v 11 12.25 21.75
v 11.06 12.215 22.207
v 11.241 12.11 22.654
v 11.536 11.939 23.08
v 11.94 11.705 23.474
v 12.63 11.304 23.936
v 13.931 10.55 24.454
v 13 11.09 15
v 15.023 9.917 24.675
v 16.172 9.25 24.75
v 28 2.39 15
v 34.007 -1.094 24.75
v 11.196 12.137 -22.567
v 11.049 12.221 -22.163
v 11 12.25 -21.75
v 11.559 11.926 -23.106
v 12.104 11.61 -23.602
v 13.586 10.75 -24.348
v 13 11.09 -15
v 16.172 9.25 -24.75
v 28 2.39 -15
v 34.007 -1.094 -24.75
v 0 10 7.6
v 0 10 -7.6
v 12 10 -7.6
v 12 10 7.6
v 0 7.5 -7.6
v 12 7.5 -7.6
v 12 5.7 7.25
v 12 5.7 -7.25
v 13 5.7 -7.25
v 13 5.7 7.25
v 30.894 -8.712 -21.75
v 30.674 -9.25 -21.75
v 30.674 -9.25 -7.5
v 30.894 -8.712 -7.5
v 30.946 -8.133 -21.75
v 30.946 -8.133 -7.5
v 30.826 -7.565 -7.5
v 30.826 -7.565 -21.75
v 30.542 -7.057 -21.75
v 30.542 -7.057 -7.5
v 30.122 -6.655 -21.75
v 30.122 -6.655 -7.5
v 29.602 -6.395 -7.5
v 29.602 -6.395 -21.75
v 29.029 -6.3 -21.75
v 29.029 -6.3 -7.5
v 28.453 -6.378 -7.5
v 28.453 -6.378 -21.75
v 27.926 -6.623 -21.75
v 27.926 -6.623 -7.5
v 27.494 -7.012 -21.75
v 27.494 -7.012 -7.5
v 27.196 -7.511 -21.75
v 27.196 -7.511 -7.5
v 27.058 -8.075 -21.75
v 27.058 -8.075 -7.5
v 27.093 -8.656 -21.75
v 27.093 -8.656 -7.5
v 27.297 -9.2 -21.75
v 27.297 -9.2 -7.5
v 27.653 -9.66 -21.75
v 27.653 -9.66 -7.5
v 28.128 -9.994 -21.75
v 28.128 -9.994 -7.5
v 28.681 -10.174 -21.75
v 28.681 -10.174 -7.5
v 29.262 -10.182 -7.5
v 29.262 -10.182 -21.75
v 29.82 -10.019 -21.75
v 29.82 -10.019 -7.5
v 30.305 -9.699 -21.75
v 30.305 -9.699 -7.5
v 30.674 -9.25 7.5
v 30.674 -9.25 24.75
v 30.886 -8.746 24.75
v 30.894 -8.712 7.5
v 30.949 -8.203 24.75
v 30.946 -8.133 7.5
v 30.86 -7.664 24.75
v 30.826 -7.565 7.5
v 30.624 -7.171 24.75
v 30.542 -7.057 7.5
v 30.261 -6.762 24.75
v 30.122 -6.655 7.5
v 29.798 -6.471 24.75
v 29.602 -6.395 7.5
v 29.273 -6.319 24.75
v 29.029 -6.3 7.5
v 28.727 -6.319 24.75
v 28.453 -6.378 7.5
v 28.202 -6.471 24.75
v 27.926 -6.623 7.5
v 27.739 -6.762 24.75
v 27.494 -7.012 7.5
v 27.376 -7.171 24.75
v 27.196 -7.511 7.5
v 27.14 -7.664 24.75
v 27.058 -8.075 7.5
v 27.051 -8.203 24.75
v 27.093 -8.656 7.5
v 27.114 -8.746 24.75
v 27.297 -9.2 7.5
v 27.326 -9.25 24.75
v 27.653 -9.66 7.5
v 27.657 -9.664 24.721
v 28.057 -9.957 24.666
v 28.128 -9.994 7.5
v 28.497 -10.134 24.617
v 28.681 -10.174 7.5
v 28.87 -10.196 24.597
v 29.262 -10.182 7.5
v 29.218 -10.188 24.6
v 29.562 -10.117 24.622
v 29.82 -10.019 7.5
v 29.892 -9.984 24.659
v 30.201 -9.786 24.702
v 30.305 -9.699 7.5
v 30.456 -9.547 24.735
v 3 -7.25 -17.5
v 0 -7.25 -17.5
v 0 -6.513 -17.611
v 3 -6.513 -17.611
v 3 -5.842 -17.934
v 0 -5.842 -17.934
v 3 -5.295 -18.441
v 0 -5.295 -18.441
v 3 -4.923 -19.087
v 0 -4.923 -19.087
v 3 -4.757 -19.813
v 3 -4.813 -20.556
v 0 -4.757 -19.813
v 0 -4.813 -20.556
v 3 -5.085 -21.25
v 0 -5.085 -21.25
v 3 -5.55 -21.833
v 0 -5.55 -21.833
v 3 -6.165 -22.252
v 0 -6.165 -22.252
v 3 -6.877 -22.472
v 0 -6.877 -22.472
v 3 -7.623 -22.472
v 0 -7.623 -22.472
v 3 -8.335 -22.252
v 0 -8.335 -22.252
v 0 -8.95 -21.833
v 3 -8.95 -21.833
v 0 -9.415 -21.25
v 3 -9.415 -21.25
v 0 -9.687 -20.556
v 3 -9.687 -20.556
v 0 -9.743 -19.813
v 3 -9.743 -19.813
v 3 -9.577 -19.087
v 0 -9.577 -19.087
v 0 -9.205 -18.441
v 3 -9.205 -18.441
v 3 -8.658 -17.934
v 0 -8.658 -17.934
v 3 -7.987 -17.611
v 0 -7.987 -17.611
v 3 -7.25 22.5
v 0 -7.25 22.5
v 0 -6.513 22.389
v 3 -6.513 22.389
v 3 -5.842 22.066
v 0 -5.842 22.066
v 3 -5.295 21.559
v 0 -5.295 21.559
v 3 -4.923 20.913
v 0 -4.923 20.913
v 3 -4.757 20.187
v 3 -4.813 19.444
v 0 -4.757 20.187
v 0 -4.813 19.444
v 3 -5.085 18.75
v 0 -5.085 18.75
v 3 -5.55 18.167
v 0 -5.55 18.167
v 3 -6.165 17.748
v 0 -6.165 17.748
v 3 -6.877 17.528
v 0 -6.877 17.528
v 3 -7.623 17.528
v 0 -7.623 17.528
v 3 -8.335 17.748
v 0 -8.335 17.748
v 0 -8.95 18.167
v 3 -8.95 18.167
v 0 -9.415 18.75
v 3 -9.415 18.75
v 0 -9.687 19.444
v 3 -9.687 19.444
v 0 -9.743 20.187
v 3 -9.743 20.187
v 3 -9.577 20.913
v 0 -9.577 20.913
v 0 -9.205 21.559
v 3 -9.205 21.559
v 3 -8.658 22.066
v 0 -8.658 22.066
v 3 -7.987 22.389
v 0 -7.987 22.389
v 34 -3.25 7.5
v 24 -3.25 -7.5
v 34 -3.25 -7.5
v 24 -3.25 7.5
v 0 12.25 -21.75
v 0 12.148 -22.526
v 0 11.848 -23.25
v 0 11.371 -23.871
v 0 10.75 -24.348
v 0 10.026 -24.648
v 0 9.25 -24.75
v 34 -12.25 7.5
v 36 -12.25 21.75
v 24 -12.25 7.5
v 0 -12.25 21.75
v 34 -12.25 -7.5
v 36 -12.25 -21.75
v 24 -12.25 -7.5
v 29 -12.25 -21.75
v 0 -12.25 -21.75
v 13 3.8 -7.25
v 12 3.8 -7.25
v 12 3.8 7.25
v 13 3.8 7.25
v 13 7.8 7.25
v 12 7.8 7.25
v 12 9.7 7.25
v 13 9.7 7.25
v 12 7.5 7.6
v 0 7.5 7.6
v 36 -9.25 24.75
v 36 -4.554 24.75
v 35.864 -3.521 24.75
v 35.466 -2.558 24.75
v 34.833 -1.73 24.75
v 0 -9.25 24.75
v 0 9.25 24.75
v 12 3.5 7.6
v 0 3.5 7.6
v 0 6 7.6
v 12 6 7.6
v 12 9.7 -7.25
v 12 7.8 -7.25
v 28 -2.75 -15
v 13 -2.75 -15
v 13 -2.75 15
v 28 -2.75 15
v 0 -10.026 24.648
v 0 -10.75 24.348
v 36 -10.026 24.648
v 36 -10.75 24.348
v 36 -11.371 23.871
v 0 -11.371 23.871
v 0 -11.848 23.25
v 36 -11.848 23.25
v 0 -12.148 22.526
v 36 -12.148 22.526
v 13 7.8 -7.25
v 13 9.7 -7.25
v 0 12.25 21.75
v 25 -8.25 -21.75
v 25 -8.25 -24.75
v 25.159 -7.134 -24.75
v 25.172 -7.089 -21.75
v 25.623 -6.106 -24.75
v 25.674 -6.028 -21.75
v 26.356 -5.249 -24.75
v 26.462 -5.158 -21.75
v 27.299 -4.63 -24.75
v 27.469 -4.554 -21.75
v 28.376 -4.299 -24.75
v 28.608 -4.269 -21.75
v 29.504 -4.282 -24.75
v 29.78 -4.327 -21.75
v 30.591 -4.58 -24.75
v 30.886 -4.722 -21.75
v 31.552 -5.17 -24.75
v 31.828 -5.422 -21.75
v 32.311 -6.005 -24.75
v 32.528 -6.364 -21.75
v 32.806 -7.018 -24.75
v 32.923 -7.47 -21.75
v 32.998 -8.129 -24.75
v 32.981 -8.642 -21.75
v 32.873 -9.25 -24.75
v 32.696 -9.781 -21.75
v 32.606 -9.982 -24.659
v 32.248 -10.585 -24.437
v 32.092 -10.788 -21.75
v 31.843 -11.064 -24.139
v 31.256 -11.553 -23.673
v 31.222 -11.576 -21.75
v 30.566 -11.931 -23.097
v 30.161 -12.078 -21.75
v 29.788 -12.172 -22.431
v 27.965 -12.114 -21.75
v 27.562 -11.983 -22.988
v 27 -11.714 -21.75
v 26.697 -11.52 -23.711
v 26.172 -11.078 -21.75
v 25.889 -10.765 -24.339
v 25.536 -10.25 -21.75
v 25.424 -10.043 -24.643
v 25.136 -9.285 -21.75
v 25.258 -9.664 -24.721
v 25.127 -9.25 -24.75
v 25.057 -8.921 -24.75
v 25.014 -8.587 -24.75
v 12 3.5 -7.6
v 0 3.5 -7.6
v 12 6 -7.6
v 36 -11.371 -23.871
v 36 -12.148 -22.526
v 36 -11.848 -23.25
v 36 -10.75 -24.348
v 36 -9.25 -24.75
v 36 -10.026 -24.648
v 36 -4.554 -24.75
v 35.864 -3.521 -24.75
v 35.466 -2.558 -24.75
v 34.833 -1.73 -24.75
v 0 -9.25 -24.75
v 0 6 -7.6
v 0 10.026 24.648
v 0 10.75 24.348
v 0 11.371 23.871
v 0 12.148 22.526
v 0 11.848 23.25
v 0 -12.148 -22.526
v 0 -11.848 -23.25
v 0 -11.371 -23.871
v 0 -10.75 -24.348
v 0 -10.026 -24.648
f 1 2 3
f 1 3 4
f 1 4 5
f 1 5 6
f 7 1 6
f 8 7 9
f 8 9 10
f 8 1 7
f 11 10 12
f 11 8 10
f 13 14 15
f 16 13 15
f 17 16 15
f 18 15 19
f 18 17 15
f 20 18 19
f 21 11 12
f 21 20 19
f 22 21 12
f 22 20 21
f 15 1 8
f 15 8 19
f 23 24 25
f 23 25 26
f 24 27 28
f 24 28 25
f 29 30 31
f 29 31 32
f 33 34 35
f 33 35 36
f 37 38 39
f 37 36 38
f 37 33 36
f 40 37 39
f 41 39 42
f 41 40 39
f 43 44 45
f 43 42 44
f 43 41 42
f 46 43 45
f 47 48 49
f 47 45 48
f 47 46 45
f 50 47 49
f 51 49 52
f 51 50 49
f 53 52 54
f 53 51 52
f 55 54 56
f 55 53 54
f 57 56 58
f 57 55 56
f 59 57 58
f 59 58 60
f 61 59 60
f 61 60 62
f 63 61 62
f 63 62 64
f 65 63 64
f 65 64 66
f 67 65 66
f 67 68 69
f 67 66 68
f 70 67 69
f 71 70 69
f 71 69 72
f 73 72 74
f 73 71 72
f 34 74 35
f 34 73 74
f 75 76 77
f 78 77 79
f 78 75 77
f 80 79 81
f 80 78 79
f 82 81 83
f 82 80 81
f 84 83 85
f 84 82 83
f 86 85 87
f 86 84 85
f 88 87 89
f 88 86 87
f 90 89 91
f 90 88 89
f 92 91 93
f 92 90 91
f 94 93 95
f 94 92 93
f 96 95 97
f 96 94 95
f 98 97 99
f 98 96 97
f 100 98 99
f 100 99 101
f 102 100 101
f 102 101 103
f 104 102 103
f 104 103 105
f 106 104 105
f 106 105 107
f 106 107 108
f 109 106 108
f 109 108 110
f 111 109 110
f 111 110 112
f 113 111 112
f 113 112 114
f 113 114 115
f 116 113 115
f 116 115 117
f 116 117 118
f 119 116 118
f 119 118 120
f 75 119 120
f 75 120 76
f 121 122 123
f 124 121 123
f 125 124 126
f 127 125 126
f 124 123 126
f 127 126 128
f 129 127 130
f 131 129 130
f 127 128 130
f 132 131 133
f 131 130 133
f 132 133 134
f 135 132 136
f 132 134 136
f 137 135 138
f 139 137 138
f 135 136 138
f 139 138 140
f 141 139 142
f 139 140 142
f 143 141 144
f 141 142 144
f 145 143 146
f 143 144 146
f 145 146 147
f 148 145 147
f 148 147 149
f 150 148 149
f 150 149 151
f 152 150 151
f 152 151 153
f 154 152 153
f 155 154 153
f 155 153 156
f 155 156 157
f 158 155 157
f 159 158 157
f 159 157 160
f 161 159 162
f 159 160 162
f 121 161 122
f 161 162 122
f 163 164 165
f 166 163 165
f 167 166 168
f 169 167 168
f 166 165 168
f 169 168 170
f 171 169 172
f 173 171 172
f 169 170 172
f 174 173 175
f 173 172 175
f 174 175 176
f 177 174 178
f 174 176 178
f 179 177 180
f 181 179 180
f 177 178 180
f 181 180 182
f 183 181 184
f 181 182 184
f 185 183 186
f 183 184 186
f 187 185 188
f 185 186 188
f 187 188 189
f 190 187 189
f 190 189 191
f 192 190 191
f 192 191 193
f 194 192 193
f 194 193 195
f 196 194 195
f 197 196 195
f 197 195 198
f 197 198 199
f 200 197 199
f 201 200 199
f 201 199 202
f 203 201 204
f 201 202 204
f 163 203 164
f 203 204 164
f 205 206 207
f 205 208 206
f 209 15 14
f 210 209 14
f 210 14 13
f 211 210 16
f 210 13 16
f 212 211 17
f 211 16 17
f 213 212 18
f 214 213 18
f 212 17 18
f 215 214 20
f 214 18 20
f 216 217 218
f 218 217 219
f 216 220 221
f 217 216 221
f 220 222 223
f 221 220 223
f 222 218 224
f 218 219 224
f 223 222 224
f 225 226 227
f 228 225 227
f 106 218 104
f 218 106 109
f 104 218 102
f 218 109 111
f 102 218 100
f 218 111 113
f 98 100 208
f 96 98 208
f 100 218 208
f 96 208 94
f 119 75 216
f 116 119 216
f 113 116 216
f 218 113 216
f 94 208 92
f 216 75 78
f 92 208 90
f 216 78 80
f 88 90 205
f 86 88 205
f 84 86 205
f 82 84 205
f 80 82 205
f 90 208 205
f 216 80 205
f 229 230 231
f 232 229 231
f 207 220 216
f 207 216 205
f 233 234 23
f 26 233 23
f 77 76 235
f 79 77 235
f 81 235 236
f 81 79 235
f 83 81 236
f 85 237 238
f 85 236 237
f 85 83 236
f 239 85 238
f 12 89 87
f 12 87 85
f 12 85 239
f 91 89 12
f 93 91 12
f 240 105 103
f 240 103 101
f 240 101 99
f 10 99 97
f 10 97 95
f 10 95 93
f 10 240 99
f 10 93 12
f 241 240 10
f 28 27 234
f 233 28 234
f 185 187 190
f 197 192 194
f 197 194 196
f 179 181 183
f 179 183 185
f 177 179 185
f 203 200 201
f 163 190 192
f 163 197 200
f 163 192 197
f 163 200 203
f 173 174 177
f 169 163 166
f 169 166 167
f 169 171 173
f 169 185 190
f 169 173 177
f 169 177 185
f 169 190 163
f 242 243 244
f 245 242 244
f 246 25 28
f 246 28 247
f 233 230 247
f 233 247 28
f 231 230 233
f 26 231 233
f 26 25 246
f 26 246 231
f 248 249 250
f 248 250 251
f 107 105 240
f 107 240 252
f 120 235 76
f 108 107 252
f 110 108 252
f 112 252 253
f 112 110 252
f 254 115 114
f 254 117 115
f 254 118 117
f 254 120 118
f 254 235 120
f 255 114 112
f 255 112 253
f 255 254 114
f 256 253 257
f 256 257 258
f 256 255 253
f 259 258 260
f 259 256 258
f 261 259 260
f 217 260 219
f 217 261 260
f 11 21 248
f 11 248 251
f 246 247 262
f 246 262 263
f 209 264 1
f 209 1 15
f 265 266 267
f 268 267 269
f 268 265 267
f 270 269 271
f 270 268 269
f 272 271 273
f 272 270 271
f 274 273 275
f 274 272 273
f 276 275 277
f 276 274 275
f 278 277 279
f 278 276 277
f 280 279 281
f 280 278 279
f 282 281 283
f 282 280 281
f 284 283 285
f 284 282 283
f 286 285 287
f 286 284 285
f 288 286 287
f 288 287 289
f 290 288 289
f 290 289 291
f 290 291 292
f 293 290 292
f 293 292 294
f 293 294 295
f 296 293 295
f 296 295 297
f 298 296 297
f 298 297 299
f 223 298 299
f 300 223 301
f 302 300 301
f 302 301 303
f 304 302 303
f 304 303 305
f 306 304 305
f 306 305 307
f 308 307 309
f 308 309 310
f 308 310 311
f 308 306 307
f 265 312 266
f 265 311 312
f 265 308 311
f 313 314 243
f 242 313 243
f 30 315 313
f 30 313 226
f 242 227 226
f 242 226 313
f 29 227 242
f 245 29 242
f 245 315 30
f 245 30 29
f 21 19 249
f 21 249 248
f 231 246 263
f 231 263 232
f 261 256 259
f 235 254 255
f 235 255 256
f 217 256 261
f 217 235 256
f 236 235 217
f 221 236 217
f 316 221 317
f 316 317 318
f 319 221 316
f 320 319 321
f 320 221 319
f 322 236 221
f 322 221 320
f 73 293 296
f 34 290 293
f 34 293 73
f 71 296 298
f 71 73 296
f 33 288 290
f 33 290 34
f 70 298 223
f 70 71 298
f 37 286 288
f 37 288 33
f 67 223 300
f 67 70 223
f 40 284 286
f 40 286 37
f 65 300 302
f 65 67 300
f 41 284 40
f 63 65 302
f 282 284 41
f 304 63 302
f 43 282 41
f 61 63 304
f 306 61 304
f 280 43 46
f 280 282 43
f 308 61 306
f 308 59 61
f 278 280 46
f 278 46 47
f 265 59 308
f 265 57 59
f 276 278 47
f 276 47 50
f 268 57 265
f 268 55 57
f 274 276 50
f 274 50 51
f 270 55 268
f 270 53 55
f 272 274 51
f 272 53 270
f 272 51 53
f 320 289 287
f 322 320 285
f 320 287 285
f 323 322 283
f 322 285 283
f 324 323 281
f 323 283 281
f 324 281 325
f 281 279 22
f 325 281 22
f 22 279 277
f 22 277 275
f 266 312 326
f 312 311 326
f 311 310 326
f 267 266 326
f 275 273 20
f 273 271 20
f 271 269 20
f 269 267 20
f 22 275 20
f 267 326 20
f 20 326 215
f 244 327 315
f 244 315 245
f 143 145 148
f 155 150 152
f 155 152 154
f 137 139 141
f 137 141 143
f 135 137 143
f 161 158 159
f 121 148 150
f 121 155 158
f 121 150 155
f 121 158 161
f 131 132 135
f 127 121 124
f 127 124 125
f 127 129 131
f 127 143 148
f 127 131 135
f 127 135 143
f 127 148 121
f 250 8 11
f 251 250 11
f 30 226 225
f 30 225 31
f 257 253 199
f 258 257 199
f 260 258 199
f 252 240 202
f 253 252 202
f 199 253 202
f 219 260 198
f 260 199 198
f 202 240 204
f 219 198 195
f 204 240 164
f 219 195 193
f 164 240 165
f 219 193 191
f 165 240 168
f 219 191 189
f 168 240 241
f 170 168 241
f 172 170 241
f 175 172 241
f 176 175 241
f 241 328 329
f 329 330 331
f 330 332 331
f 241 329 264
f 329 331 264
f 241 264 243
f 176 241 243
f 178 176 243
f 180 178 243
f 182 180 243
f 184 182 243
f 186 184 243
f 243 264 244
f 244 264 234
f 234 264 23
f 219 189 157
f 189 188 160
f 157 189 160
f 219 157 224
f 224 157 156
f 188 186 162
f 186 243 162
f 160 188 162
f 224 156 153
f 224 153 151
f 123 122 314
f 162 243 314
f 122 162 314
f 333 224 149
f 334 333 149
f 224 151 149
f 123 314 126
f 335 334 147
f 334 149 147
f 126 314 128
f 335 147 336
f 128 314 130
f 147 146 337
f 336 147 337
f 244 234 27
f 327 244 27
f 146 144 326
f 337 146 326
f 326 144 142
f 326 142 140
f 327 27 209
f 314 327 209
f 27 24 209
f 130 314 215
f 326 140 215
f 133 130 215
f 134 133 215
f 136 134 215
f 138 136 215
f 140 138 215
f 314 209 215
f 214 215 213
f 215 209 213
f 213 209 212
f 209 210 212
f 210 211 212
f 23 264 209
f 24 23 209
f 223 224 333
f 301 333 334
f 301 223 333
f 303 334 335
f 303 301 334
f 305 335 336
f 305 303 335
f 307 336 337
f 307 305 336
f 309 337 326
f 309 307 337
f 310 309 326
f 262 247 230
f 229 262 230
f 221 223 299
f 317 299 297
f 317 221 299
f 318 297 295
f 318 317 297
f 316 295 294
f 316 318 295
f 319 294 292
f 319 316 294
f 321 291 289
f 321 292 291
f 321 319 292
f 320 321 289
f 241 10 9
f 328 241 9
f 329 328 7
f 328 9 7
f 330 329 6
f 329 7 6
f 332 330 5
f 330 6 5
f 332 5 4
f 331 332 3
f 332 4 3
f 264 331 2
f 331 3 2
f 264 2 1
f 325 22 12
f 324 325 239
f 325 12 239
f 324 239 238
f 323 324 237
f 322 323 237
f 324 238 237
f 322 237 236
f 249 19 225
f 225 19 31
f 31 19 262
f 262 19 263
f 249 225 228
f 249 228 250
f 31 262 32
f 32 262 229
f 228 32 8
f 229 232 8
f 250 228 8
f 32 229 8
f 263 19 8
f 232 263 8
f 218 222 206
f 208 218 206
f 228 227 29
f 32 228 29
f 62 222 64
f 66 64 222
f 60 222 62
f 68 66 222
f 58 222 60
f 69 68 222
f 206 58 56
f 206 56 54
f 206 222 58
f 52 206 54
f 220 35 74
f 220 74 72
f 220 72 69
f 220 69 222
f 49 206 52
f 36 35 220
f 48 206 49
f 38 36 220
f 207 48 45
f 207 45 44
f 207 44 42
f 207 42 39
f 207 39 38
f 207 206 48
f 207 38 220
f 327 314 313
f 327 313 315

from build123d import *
from build123d.topology import SkipClean

# Parameters (mm, degrees)
SKETCH_1_W               = 49.5
SKETCH_1_H               = 24.5
EXTRUDE_1_DEPTH          = 36
SKETCH_2_R               = 2.5
CUT_EXTRUDE_1_DEPTH      = 3
SKETCH_3_W               = 15.2
SKETCH_3_H               = 2.5
CUT_EXTRUDE_2_DEPTH      = 12
FILLET_1_R               = 3
CUT_EXTRUDE_3_DEPTH      = 46.372072908
CUT_EXTRUDE_3_DEPTH_BACK = 46.372072908
SKETCH_5_R               = 1.95
CUT_EXTRUDE_4_DEPTH      = 63.42044953
CUT_EXTRUDE_4_DEPTH_BACK = 3
SKETCH_6_R               = 4
SKETCH_7_W               = 10
SKETCH_7_H               = 9
CUT_EXTRUDE_5_DEPTH      = 7.5
CUT_EXTRUDE_6_DEPTH      = 63.42044953
FILLET_2_R               = 4
SKETCH_9_W               = 15
SKETCH_9_H               = 30
CUT_EXTRUDE_7_DEPTH      = 15
SKETCH_11_W              = 14.5
SKETCH_11_H              = 1.9
CUT_EXTRUDE_8_DEPTH      = 2


with BuildPart() as part:
    # Эскиз1 → Бобышка-Вытянуть1 (new body)
    with BuildSketch(Plane(origin=(0, 0, 0), x_dir=(0, 0, -1), z_dir=(1, 0, 0))):
        Rectangle(SKETCH_1_W, SKETCH_1_H)
    extrude(amount=EXTRUDE_1_DEPTH)

    # Эскиз2 → Вырез-Вытянуть1 (cut)
    with BuildSketch(Plane.ZY):
        with Locations((-20, -7.25)):
            Circle(SKETCH_2_R)
        with Locations((20, -7.25)):
            Circle(SKETCH_2_R)
    extrude(amount=-CUT_EXTRUDE_1_DEPTH, mode=Mode.SUBTRACT)

    # Эскиз3 → Вырез-Вытянуть2 (cut)
    with BuildSketch(Plane.ZY):
        with Locations((0, 4.75)):
            Rectangle(SKETCH_3_W, SKETCH_3_H)
        with Locations((0, 8.75)):
            Rectangle(SKETCH_3_W, SKETCH_3_H)
    extrude(amount=-CUT_EXTRUDE_2_DEPTH, mode=Mode.SUBTRACT)

    # Скругление1
    fillet_1_edges = [part.edges().sort_by_distance(p)[0] for p in [
        (18, 12.25, -24.75),
        (18, -12.25, -24.75),
        (18, -12.25, 24.75),
        (18, 12.25, 24.75),
    ]]
    fillet(fillet_1_edges, radius=FILLET_1_R)

    # Эскиз5 → Вырез-Вытянуть3 (cut, two sides: drawn at the far end of the back side and taken through both)
    with BuildSketch(Plane.XY.offset(-CUT_EXTRUDE_3_DEPTH_BACK)):
        with Locations(Location((29, -8.25, 0), (0, 0, 329.148114014))):
            Circle(SKETCH_5_R)
    extrude(amount=CUT_EXTRUDE_3_DEPTH + CUT_EXTRUDE_3_DEPTH_BACK, mode=Mode.SUBTRACT)

    # Эскиз6 → Вырез-Вытянуть4 (cut, two sides: drawn at the far end of the back side and taken through both)
    with BuildSketch(Plane(origin=(0, 0, -24.75), x_dir=(-1, 0, 0), z_dir=(0, 0, -1)).offset(-CUT_EXTRUDE_4_DEPTH_BACK)):
        with Locations((-29, -8.25)):
            Circle(SKETCH_6_R)
    extrude(amount=CUT_EXTRUDE_4_DEPTH + CUT_EXTRUDE_4_DEPTH_BACK, mode=Mode.SUBTRACT)

    # Эскиз7 → Вырез-Вытянуть5 (cut, symmetric)
    with SkipClean():  # the faces are left unmerged after this step: merging them gives an invalid solid
        with BuildSketch(Plane.XY):
            with Locations((29, -7.75)):
                Rectangle(SKETCH_7_W, SKETCH_7_H)
        extrude(amount=CUT_EXTRUDE_5_DEPTH, both=True, mode=Mode.SUBTRACT)

    # Эскиз8 → Вырез-Вытянуть6 (cut, through all)
    with SkipClean():  # the faces are left unmerged after this step: merging them gives an invalid solid
        with BuildSketch(Plane(origin=(0, 0, -24.75), x_dir=(-1, 0, 0), z_dir=(0, 0, -1))):
            Polygon((-11, 12.25), (-36, -2.25), (-36, 12.25), align=None)
        extrude(amount=-CUT_EXTRUDE_6_DEPTH, mode=Mode.SUBTRACT)

    # Скругление2
    fillet_2_edges = [part.edges().sort_by_distance(p)[0] for p in [
        (36, -2.25, 0),
    ]]
    fillet(fillet_2_edges, radius=FILLET_2_R)

    # Эскиз9 → Вырез-Вытянуть7 (cut)
    with BuildSketch(Plane.XZ.offset(-12.25)):
        with Locations((20.5, 0)):
            Rectangle(SKETCH_9_W, SKETCH_9_H)
    extrude(amount=CUT_EXTRUDE_7_DEPTH, mode=Mode.SUBTRACT)

    # Эскиз11 → Вырез-Вытянуть8 (cut)
    with BuildSketch(Plane.ZY.offset(-12)):
        with Locations((0, 8.75)):
            Rectangle(SKETCH_11_W, SKETCH_11_H)
        with Locations((0, 4.75)):
            Rectangle(SKETCH_11_W, SKETCH_11_H)
    extrude(amount=-CUT_EXTRUDE_8_DEPTH, mode=Mode.SUBTRACT)


solid = part.part
